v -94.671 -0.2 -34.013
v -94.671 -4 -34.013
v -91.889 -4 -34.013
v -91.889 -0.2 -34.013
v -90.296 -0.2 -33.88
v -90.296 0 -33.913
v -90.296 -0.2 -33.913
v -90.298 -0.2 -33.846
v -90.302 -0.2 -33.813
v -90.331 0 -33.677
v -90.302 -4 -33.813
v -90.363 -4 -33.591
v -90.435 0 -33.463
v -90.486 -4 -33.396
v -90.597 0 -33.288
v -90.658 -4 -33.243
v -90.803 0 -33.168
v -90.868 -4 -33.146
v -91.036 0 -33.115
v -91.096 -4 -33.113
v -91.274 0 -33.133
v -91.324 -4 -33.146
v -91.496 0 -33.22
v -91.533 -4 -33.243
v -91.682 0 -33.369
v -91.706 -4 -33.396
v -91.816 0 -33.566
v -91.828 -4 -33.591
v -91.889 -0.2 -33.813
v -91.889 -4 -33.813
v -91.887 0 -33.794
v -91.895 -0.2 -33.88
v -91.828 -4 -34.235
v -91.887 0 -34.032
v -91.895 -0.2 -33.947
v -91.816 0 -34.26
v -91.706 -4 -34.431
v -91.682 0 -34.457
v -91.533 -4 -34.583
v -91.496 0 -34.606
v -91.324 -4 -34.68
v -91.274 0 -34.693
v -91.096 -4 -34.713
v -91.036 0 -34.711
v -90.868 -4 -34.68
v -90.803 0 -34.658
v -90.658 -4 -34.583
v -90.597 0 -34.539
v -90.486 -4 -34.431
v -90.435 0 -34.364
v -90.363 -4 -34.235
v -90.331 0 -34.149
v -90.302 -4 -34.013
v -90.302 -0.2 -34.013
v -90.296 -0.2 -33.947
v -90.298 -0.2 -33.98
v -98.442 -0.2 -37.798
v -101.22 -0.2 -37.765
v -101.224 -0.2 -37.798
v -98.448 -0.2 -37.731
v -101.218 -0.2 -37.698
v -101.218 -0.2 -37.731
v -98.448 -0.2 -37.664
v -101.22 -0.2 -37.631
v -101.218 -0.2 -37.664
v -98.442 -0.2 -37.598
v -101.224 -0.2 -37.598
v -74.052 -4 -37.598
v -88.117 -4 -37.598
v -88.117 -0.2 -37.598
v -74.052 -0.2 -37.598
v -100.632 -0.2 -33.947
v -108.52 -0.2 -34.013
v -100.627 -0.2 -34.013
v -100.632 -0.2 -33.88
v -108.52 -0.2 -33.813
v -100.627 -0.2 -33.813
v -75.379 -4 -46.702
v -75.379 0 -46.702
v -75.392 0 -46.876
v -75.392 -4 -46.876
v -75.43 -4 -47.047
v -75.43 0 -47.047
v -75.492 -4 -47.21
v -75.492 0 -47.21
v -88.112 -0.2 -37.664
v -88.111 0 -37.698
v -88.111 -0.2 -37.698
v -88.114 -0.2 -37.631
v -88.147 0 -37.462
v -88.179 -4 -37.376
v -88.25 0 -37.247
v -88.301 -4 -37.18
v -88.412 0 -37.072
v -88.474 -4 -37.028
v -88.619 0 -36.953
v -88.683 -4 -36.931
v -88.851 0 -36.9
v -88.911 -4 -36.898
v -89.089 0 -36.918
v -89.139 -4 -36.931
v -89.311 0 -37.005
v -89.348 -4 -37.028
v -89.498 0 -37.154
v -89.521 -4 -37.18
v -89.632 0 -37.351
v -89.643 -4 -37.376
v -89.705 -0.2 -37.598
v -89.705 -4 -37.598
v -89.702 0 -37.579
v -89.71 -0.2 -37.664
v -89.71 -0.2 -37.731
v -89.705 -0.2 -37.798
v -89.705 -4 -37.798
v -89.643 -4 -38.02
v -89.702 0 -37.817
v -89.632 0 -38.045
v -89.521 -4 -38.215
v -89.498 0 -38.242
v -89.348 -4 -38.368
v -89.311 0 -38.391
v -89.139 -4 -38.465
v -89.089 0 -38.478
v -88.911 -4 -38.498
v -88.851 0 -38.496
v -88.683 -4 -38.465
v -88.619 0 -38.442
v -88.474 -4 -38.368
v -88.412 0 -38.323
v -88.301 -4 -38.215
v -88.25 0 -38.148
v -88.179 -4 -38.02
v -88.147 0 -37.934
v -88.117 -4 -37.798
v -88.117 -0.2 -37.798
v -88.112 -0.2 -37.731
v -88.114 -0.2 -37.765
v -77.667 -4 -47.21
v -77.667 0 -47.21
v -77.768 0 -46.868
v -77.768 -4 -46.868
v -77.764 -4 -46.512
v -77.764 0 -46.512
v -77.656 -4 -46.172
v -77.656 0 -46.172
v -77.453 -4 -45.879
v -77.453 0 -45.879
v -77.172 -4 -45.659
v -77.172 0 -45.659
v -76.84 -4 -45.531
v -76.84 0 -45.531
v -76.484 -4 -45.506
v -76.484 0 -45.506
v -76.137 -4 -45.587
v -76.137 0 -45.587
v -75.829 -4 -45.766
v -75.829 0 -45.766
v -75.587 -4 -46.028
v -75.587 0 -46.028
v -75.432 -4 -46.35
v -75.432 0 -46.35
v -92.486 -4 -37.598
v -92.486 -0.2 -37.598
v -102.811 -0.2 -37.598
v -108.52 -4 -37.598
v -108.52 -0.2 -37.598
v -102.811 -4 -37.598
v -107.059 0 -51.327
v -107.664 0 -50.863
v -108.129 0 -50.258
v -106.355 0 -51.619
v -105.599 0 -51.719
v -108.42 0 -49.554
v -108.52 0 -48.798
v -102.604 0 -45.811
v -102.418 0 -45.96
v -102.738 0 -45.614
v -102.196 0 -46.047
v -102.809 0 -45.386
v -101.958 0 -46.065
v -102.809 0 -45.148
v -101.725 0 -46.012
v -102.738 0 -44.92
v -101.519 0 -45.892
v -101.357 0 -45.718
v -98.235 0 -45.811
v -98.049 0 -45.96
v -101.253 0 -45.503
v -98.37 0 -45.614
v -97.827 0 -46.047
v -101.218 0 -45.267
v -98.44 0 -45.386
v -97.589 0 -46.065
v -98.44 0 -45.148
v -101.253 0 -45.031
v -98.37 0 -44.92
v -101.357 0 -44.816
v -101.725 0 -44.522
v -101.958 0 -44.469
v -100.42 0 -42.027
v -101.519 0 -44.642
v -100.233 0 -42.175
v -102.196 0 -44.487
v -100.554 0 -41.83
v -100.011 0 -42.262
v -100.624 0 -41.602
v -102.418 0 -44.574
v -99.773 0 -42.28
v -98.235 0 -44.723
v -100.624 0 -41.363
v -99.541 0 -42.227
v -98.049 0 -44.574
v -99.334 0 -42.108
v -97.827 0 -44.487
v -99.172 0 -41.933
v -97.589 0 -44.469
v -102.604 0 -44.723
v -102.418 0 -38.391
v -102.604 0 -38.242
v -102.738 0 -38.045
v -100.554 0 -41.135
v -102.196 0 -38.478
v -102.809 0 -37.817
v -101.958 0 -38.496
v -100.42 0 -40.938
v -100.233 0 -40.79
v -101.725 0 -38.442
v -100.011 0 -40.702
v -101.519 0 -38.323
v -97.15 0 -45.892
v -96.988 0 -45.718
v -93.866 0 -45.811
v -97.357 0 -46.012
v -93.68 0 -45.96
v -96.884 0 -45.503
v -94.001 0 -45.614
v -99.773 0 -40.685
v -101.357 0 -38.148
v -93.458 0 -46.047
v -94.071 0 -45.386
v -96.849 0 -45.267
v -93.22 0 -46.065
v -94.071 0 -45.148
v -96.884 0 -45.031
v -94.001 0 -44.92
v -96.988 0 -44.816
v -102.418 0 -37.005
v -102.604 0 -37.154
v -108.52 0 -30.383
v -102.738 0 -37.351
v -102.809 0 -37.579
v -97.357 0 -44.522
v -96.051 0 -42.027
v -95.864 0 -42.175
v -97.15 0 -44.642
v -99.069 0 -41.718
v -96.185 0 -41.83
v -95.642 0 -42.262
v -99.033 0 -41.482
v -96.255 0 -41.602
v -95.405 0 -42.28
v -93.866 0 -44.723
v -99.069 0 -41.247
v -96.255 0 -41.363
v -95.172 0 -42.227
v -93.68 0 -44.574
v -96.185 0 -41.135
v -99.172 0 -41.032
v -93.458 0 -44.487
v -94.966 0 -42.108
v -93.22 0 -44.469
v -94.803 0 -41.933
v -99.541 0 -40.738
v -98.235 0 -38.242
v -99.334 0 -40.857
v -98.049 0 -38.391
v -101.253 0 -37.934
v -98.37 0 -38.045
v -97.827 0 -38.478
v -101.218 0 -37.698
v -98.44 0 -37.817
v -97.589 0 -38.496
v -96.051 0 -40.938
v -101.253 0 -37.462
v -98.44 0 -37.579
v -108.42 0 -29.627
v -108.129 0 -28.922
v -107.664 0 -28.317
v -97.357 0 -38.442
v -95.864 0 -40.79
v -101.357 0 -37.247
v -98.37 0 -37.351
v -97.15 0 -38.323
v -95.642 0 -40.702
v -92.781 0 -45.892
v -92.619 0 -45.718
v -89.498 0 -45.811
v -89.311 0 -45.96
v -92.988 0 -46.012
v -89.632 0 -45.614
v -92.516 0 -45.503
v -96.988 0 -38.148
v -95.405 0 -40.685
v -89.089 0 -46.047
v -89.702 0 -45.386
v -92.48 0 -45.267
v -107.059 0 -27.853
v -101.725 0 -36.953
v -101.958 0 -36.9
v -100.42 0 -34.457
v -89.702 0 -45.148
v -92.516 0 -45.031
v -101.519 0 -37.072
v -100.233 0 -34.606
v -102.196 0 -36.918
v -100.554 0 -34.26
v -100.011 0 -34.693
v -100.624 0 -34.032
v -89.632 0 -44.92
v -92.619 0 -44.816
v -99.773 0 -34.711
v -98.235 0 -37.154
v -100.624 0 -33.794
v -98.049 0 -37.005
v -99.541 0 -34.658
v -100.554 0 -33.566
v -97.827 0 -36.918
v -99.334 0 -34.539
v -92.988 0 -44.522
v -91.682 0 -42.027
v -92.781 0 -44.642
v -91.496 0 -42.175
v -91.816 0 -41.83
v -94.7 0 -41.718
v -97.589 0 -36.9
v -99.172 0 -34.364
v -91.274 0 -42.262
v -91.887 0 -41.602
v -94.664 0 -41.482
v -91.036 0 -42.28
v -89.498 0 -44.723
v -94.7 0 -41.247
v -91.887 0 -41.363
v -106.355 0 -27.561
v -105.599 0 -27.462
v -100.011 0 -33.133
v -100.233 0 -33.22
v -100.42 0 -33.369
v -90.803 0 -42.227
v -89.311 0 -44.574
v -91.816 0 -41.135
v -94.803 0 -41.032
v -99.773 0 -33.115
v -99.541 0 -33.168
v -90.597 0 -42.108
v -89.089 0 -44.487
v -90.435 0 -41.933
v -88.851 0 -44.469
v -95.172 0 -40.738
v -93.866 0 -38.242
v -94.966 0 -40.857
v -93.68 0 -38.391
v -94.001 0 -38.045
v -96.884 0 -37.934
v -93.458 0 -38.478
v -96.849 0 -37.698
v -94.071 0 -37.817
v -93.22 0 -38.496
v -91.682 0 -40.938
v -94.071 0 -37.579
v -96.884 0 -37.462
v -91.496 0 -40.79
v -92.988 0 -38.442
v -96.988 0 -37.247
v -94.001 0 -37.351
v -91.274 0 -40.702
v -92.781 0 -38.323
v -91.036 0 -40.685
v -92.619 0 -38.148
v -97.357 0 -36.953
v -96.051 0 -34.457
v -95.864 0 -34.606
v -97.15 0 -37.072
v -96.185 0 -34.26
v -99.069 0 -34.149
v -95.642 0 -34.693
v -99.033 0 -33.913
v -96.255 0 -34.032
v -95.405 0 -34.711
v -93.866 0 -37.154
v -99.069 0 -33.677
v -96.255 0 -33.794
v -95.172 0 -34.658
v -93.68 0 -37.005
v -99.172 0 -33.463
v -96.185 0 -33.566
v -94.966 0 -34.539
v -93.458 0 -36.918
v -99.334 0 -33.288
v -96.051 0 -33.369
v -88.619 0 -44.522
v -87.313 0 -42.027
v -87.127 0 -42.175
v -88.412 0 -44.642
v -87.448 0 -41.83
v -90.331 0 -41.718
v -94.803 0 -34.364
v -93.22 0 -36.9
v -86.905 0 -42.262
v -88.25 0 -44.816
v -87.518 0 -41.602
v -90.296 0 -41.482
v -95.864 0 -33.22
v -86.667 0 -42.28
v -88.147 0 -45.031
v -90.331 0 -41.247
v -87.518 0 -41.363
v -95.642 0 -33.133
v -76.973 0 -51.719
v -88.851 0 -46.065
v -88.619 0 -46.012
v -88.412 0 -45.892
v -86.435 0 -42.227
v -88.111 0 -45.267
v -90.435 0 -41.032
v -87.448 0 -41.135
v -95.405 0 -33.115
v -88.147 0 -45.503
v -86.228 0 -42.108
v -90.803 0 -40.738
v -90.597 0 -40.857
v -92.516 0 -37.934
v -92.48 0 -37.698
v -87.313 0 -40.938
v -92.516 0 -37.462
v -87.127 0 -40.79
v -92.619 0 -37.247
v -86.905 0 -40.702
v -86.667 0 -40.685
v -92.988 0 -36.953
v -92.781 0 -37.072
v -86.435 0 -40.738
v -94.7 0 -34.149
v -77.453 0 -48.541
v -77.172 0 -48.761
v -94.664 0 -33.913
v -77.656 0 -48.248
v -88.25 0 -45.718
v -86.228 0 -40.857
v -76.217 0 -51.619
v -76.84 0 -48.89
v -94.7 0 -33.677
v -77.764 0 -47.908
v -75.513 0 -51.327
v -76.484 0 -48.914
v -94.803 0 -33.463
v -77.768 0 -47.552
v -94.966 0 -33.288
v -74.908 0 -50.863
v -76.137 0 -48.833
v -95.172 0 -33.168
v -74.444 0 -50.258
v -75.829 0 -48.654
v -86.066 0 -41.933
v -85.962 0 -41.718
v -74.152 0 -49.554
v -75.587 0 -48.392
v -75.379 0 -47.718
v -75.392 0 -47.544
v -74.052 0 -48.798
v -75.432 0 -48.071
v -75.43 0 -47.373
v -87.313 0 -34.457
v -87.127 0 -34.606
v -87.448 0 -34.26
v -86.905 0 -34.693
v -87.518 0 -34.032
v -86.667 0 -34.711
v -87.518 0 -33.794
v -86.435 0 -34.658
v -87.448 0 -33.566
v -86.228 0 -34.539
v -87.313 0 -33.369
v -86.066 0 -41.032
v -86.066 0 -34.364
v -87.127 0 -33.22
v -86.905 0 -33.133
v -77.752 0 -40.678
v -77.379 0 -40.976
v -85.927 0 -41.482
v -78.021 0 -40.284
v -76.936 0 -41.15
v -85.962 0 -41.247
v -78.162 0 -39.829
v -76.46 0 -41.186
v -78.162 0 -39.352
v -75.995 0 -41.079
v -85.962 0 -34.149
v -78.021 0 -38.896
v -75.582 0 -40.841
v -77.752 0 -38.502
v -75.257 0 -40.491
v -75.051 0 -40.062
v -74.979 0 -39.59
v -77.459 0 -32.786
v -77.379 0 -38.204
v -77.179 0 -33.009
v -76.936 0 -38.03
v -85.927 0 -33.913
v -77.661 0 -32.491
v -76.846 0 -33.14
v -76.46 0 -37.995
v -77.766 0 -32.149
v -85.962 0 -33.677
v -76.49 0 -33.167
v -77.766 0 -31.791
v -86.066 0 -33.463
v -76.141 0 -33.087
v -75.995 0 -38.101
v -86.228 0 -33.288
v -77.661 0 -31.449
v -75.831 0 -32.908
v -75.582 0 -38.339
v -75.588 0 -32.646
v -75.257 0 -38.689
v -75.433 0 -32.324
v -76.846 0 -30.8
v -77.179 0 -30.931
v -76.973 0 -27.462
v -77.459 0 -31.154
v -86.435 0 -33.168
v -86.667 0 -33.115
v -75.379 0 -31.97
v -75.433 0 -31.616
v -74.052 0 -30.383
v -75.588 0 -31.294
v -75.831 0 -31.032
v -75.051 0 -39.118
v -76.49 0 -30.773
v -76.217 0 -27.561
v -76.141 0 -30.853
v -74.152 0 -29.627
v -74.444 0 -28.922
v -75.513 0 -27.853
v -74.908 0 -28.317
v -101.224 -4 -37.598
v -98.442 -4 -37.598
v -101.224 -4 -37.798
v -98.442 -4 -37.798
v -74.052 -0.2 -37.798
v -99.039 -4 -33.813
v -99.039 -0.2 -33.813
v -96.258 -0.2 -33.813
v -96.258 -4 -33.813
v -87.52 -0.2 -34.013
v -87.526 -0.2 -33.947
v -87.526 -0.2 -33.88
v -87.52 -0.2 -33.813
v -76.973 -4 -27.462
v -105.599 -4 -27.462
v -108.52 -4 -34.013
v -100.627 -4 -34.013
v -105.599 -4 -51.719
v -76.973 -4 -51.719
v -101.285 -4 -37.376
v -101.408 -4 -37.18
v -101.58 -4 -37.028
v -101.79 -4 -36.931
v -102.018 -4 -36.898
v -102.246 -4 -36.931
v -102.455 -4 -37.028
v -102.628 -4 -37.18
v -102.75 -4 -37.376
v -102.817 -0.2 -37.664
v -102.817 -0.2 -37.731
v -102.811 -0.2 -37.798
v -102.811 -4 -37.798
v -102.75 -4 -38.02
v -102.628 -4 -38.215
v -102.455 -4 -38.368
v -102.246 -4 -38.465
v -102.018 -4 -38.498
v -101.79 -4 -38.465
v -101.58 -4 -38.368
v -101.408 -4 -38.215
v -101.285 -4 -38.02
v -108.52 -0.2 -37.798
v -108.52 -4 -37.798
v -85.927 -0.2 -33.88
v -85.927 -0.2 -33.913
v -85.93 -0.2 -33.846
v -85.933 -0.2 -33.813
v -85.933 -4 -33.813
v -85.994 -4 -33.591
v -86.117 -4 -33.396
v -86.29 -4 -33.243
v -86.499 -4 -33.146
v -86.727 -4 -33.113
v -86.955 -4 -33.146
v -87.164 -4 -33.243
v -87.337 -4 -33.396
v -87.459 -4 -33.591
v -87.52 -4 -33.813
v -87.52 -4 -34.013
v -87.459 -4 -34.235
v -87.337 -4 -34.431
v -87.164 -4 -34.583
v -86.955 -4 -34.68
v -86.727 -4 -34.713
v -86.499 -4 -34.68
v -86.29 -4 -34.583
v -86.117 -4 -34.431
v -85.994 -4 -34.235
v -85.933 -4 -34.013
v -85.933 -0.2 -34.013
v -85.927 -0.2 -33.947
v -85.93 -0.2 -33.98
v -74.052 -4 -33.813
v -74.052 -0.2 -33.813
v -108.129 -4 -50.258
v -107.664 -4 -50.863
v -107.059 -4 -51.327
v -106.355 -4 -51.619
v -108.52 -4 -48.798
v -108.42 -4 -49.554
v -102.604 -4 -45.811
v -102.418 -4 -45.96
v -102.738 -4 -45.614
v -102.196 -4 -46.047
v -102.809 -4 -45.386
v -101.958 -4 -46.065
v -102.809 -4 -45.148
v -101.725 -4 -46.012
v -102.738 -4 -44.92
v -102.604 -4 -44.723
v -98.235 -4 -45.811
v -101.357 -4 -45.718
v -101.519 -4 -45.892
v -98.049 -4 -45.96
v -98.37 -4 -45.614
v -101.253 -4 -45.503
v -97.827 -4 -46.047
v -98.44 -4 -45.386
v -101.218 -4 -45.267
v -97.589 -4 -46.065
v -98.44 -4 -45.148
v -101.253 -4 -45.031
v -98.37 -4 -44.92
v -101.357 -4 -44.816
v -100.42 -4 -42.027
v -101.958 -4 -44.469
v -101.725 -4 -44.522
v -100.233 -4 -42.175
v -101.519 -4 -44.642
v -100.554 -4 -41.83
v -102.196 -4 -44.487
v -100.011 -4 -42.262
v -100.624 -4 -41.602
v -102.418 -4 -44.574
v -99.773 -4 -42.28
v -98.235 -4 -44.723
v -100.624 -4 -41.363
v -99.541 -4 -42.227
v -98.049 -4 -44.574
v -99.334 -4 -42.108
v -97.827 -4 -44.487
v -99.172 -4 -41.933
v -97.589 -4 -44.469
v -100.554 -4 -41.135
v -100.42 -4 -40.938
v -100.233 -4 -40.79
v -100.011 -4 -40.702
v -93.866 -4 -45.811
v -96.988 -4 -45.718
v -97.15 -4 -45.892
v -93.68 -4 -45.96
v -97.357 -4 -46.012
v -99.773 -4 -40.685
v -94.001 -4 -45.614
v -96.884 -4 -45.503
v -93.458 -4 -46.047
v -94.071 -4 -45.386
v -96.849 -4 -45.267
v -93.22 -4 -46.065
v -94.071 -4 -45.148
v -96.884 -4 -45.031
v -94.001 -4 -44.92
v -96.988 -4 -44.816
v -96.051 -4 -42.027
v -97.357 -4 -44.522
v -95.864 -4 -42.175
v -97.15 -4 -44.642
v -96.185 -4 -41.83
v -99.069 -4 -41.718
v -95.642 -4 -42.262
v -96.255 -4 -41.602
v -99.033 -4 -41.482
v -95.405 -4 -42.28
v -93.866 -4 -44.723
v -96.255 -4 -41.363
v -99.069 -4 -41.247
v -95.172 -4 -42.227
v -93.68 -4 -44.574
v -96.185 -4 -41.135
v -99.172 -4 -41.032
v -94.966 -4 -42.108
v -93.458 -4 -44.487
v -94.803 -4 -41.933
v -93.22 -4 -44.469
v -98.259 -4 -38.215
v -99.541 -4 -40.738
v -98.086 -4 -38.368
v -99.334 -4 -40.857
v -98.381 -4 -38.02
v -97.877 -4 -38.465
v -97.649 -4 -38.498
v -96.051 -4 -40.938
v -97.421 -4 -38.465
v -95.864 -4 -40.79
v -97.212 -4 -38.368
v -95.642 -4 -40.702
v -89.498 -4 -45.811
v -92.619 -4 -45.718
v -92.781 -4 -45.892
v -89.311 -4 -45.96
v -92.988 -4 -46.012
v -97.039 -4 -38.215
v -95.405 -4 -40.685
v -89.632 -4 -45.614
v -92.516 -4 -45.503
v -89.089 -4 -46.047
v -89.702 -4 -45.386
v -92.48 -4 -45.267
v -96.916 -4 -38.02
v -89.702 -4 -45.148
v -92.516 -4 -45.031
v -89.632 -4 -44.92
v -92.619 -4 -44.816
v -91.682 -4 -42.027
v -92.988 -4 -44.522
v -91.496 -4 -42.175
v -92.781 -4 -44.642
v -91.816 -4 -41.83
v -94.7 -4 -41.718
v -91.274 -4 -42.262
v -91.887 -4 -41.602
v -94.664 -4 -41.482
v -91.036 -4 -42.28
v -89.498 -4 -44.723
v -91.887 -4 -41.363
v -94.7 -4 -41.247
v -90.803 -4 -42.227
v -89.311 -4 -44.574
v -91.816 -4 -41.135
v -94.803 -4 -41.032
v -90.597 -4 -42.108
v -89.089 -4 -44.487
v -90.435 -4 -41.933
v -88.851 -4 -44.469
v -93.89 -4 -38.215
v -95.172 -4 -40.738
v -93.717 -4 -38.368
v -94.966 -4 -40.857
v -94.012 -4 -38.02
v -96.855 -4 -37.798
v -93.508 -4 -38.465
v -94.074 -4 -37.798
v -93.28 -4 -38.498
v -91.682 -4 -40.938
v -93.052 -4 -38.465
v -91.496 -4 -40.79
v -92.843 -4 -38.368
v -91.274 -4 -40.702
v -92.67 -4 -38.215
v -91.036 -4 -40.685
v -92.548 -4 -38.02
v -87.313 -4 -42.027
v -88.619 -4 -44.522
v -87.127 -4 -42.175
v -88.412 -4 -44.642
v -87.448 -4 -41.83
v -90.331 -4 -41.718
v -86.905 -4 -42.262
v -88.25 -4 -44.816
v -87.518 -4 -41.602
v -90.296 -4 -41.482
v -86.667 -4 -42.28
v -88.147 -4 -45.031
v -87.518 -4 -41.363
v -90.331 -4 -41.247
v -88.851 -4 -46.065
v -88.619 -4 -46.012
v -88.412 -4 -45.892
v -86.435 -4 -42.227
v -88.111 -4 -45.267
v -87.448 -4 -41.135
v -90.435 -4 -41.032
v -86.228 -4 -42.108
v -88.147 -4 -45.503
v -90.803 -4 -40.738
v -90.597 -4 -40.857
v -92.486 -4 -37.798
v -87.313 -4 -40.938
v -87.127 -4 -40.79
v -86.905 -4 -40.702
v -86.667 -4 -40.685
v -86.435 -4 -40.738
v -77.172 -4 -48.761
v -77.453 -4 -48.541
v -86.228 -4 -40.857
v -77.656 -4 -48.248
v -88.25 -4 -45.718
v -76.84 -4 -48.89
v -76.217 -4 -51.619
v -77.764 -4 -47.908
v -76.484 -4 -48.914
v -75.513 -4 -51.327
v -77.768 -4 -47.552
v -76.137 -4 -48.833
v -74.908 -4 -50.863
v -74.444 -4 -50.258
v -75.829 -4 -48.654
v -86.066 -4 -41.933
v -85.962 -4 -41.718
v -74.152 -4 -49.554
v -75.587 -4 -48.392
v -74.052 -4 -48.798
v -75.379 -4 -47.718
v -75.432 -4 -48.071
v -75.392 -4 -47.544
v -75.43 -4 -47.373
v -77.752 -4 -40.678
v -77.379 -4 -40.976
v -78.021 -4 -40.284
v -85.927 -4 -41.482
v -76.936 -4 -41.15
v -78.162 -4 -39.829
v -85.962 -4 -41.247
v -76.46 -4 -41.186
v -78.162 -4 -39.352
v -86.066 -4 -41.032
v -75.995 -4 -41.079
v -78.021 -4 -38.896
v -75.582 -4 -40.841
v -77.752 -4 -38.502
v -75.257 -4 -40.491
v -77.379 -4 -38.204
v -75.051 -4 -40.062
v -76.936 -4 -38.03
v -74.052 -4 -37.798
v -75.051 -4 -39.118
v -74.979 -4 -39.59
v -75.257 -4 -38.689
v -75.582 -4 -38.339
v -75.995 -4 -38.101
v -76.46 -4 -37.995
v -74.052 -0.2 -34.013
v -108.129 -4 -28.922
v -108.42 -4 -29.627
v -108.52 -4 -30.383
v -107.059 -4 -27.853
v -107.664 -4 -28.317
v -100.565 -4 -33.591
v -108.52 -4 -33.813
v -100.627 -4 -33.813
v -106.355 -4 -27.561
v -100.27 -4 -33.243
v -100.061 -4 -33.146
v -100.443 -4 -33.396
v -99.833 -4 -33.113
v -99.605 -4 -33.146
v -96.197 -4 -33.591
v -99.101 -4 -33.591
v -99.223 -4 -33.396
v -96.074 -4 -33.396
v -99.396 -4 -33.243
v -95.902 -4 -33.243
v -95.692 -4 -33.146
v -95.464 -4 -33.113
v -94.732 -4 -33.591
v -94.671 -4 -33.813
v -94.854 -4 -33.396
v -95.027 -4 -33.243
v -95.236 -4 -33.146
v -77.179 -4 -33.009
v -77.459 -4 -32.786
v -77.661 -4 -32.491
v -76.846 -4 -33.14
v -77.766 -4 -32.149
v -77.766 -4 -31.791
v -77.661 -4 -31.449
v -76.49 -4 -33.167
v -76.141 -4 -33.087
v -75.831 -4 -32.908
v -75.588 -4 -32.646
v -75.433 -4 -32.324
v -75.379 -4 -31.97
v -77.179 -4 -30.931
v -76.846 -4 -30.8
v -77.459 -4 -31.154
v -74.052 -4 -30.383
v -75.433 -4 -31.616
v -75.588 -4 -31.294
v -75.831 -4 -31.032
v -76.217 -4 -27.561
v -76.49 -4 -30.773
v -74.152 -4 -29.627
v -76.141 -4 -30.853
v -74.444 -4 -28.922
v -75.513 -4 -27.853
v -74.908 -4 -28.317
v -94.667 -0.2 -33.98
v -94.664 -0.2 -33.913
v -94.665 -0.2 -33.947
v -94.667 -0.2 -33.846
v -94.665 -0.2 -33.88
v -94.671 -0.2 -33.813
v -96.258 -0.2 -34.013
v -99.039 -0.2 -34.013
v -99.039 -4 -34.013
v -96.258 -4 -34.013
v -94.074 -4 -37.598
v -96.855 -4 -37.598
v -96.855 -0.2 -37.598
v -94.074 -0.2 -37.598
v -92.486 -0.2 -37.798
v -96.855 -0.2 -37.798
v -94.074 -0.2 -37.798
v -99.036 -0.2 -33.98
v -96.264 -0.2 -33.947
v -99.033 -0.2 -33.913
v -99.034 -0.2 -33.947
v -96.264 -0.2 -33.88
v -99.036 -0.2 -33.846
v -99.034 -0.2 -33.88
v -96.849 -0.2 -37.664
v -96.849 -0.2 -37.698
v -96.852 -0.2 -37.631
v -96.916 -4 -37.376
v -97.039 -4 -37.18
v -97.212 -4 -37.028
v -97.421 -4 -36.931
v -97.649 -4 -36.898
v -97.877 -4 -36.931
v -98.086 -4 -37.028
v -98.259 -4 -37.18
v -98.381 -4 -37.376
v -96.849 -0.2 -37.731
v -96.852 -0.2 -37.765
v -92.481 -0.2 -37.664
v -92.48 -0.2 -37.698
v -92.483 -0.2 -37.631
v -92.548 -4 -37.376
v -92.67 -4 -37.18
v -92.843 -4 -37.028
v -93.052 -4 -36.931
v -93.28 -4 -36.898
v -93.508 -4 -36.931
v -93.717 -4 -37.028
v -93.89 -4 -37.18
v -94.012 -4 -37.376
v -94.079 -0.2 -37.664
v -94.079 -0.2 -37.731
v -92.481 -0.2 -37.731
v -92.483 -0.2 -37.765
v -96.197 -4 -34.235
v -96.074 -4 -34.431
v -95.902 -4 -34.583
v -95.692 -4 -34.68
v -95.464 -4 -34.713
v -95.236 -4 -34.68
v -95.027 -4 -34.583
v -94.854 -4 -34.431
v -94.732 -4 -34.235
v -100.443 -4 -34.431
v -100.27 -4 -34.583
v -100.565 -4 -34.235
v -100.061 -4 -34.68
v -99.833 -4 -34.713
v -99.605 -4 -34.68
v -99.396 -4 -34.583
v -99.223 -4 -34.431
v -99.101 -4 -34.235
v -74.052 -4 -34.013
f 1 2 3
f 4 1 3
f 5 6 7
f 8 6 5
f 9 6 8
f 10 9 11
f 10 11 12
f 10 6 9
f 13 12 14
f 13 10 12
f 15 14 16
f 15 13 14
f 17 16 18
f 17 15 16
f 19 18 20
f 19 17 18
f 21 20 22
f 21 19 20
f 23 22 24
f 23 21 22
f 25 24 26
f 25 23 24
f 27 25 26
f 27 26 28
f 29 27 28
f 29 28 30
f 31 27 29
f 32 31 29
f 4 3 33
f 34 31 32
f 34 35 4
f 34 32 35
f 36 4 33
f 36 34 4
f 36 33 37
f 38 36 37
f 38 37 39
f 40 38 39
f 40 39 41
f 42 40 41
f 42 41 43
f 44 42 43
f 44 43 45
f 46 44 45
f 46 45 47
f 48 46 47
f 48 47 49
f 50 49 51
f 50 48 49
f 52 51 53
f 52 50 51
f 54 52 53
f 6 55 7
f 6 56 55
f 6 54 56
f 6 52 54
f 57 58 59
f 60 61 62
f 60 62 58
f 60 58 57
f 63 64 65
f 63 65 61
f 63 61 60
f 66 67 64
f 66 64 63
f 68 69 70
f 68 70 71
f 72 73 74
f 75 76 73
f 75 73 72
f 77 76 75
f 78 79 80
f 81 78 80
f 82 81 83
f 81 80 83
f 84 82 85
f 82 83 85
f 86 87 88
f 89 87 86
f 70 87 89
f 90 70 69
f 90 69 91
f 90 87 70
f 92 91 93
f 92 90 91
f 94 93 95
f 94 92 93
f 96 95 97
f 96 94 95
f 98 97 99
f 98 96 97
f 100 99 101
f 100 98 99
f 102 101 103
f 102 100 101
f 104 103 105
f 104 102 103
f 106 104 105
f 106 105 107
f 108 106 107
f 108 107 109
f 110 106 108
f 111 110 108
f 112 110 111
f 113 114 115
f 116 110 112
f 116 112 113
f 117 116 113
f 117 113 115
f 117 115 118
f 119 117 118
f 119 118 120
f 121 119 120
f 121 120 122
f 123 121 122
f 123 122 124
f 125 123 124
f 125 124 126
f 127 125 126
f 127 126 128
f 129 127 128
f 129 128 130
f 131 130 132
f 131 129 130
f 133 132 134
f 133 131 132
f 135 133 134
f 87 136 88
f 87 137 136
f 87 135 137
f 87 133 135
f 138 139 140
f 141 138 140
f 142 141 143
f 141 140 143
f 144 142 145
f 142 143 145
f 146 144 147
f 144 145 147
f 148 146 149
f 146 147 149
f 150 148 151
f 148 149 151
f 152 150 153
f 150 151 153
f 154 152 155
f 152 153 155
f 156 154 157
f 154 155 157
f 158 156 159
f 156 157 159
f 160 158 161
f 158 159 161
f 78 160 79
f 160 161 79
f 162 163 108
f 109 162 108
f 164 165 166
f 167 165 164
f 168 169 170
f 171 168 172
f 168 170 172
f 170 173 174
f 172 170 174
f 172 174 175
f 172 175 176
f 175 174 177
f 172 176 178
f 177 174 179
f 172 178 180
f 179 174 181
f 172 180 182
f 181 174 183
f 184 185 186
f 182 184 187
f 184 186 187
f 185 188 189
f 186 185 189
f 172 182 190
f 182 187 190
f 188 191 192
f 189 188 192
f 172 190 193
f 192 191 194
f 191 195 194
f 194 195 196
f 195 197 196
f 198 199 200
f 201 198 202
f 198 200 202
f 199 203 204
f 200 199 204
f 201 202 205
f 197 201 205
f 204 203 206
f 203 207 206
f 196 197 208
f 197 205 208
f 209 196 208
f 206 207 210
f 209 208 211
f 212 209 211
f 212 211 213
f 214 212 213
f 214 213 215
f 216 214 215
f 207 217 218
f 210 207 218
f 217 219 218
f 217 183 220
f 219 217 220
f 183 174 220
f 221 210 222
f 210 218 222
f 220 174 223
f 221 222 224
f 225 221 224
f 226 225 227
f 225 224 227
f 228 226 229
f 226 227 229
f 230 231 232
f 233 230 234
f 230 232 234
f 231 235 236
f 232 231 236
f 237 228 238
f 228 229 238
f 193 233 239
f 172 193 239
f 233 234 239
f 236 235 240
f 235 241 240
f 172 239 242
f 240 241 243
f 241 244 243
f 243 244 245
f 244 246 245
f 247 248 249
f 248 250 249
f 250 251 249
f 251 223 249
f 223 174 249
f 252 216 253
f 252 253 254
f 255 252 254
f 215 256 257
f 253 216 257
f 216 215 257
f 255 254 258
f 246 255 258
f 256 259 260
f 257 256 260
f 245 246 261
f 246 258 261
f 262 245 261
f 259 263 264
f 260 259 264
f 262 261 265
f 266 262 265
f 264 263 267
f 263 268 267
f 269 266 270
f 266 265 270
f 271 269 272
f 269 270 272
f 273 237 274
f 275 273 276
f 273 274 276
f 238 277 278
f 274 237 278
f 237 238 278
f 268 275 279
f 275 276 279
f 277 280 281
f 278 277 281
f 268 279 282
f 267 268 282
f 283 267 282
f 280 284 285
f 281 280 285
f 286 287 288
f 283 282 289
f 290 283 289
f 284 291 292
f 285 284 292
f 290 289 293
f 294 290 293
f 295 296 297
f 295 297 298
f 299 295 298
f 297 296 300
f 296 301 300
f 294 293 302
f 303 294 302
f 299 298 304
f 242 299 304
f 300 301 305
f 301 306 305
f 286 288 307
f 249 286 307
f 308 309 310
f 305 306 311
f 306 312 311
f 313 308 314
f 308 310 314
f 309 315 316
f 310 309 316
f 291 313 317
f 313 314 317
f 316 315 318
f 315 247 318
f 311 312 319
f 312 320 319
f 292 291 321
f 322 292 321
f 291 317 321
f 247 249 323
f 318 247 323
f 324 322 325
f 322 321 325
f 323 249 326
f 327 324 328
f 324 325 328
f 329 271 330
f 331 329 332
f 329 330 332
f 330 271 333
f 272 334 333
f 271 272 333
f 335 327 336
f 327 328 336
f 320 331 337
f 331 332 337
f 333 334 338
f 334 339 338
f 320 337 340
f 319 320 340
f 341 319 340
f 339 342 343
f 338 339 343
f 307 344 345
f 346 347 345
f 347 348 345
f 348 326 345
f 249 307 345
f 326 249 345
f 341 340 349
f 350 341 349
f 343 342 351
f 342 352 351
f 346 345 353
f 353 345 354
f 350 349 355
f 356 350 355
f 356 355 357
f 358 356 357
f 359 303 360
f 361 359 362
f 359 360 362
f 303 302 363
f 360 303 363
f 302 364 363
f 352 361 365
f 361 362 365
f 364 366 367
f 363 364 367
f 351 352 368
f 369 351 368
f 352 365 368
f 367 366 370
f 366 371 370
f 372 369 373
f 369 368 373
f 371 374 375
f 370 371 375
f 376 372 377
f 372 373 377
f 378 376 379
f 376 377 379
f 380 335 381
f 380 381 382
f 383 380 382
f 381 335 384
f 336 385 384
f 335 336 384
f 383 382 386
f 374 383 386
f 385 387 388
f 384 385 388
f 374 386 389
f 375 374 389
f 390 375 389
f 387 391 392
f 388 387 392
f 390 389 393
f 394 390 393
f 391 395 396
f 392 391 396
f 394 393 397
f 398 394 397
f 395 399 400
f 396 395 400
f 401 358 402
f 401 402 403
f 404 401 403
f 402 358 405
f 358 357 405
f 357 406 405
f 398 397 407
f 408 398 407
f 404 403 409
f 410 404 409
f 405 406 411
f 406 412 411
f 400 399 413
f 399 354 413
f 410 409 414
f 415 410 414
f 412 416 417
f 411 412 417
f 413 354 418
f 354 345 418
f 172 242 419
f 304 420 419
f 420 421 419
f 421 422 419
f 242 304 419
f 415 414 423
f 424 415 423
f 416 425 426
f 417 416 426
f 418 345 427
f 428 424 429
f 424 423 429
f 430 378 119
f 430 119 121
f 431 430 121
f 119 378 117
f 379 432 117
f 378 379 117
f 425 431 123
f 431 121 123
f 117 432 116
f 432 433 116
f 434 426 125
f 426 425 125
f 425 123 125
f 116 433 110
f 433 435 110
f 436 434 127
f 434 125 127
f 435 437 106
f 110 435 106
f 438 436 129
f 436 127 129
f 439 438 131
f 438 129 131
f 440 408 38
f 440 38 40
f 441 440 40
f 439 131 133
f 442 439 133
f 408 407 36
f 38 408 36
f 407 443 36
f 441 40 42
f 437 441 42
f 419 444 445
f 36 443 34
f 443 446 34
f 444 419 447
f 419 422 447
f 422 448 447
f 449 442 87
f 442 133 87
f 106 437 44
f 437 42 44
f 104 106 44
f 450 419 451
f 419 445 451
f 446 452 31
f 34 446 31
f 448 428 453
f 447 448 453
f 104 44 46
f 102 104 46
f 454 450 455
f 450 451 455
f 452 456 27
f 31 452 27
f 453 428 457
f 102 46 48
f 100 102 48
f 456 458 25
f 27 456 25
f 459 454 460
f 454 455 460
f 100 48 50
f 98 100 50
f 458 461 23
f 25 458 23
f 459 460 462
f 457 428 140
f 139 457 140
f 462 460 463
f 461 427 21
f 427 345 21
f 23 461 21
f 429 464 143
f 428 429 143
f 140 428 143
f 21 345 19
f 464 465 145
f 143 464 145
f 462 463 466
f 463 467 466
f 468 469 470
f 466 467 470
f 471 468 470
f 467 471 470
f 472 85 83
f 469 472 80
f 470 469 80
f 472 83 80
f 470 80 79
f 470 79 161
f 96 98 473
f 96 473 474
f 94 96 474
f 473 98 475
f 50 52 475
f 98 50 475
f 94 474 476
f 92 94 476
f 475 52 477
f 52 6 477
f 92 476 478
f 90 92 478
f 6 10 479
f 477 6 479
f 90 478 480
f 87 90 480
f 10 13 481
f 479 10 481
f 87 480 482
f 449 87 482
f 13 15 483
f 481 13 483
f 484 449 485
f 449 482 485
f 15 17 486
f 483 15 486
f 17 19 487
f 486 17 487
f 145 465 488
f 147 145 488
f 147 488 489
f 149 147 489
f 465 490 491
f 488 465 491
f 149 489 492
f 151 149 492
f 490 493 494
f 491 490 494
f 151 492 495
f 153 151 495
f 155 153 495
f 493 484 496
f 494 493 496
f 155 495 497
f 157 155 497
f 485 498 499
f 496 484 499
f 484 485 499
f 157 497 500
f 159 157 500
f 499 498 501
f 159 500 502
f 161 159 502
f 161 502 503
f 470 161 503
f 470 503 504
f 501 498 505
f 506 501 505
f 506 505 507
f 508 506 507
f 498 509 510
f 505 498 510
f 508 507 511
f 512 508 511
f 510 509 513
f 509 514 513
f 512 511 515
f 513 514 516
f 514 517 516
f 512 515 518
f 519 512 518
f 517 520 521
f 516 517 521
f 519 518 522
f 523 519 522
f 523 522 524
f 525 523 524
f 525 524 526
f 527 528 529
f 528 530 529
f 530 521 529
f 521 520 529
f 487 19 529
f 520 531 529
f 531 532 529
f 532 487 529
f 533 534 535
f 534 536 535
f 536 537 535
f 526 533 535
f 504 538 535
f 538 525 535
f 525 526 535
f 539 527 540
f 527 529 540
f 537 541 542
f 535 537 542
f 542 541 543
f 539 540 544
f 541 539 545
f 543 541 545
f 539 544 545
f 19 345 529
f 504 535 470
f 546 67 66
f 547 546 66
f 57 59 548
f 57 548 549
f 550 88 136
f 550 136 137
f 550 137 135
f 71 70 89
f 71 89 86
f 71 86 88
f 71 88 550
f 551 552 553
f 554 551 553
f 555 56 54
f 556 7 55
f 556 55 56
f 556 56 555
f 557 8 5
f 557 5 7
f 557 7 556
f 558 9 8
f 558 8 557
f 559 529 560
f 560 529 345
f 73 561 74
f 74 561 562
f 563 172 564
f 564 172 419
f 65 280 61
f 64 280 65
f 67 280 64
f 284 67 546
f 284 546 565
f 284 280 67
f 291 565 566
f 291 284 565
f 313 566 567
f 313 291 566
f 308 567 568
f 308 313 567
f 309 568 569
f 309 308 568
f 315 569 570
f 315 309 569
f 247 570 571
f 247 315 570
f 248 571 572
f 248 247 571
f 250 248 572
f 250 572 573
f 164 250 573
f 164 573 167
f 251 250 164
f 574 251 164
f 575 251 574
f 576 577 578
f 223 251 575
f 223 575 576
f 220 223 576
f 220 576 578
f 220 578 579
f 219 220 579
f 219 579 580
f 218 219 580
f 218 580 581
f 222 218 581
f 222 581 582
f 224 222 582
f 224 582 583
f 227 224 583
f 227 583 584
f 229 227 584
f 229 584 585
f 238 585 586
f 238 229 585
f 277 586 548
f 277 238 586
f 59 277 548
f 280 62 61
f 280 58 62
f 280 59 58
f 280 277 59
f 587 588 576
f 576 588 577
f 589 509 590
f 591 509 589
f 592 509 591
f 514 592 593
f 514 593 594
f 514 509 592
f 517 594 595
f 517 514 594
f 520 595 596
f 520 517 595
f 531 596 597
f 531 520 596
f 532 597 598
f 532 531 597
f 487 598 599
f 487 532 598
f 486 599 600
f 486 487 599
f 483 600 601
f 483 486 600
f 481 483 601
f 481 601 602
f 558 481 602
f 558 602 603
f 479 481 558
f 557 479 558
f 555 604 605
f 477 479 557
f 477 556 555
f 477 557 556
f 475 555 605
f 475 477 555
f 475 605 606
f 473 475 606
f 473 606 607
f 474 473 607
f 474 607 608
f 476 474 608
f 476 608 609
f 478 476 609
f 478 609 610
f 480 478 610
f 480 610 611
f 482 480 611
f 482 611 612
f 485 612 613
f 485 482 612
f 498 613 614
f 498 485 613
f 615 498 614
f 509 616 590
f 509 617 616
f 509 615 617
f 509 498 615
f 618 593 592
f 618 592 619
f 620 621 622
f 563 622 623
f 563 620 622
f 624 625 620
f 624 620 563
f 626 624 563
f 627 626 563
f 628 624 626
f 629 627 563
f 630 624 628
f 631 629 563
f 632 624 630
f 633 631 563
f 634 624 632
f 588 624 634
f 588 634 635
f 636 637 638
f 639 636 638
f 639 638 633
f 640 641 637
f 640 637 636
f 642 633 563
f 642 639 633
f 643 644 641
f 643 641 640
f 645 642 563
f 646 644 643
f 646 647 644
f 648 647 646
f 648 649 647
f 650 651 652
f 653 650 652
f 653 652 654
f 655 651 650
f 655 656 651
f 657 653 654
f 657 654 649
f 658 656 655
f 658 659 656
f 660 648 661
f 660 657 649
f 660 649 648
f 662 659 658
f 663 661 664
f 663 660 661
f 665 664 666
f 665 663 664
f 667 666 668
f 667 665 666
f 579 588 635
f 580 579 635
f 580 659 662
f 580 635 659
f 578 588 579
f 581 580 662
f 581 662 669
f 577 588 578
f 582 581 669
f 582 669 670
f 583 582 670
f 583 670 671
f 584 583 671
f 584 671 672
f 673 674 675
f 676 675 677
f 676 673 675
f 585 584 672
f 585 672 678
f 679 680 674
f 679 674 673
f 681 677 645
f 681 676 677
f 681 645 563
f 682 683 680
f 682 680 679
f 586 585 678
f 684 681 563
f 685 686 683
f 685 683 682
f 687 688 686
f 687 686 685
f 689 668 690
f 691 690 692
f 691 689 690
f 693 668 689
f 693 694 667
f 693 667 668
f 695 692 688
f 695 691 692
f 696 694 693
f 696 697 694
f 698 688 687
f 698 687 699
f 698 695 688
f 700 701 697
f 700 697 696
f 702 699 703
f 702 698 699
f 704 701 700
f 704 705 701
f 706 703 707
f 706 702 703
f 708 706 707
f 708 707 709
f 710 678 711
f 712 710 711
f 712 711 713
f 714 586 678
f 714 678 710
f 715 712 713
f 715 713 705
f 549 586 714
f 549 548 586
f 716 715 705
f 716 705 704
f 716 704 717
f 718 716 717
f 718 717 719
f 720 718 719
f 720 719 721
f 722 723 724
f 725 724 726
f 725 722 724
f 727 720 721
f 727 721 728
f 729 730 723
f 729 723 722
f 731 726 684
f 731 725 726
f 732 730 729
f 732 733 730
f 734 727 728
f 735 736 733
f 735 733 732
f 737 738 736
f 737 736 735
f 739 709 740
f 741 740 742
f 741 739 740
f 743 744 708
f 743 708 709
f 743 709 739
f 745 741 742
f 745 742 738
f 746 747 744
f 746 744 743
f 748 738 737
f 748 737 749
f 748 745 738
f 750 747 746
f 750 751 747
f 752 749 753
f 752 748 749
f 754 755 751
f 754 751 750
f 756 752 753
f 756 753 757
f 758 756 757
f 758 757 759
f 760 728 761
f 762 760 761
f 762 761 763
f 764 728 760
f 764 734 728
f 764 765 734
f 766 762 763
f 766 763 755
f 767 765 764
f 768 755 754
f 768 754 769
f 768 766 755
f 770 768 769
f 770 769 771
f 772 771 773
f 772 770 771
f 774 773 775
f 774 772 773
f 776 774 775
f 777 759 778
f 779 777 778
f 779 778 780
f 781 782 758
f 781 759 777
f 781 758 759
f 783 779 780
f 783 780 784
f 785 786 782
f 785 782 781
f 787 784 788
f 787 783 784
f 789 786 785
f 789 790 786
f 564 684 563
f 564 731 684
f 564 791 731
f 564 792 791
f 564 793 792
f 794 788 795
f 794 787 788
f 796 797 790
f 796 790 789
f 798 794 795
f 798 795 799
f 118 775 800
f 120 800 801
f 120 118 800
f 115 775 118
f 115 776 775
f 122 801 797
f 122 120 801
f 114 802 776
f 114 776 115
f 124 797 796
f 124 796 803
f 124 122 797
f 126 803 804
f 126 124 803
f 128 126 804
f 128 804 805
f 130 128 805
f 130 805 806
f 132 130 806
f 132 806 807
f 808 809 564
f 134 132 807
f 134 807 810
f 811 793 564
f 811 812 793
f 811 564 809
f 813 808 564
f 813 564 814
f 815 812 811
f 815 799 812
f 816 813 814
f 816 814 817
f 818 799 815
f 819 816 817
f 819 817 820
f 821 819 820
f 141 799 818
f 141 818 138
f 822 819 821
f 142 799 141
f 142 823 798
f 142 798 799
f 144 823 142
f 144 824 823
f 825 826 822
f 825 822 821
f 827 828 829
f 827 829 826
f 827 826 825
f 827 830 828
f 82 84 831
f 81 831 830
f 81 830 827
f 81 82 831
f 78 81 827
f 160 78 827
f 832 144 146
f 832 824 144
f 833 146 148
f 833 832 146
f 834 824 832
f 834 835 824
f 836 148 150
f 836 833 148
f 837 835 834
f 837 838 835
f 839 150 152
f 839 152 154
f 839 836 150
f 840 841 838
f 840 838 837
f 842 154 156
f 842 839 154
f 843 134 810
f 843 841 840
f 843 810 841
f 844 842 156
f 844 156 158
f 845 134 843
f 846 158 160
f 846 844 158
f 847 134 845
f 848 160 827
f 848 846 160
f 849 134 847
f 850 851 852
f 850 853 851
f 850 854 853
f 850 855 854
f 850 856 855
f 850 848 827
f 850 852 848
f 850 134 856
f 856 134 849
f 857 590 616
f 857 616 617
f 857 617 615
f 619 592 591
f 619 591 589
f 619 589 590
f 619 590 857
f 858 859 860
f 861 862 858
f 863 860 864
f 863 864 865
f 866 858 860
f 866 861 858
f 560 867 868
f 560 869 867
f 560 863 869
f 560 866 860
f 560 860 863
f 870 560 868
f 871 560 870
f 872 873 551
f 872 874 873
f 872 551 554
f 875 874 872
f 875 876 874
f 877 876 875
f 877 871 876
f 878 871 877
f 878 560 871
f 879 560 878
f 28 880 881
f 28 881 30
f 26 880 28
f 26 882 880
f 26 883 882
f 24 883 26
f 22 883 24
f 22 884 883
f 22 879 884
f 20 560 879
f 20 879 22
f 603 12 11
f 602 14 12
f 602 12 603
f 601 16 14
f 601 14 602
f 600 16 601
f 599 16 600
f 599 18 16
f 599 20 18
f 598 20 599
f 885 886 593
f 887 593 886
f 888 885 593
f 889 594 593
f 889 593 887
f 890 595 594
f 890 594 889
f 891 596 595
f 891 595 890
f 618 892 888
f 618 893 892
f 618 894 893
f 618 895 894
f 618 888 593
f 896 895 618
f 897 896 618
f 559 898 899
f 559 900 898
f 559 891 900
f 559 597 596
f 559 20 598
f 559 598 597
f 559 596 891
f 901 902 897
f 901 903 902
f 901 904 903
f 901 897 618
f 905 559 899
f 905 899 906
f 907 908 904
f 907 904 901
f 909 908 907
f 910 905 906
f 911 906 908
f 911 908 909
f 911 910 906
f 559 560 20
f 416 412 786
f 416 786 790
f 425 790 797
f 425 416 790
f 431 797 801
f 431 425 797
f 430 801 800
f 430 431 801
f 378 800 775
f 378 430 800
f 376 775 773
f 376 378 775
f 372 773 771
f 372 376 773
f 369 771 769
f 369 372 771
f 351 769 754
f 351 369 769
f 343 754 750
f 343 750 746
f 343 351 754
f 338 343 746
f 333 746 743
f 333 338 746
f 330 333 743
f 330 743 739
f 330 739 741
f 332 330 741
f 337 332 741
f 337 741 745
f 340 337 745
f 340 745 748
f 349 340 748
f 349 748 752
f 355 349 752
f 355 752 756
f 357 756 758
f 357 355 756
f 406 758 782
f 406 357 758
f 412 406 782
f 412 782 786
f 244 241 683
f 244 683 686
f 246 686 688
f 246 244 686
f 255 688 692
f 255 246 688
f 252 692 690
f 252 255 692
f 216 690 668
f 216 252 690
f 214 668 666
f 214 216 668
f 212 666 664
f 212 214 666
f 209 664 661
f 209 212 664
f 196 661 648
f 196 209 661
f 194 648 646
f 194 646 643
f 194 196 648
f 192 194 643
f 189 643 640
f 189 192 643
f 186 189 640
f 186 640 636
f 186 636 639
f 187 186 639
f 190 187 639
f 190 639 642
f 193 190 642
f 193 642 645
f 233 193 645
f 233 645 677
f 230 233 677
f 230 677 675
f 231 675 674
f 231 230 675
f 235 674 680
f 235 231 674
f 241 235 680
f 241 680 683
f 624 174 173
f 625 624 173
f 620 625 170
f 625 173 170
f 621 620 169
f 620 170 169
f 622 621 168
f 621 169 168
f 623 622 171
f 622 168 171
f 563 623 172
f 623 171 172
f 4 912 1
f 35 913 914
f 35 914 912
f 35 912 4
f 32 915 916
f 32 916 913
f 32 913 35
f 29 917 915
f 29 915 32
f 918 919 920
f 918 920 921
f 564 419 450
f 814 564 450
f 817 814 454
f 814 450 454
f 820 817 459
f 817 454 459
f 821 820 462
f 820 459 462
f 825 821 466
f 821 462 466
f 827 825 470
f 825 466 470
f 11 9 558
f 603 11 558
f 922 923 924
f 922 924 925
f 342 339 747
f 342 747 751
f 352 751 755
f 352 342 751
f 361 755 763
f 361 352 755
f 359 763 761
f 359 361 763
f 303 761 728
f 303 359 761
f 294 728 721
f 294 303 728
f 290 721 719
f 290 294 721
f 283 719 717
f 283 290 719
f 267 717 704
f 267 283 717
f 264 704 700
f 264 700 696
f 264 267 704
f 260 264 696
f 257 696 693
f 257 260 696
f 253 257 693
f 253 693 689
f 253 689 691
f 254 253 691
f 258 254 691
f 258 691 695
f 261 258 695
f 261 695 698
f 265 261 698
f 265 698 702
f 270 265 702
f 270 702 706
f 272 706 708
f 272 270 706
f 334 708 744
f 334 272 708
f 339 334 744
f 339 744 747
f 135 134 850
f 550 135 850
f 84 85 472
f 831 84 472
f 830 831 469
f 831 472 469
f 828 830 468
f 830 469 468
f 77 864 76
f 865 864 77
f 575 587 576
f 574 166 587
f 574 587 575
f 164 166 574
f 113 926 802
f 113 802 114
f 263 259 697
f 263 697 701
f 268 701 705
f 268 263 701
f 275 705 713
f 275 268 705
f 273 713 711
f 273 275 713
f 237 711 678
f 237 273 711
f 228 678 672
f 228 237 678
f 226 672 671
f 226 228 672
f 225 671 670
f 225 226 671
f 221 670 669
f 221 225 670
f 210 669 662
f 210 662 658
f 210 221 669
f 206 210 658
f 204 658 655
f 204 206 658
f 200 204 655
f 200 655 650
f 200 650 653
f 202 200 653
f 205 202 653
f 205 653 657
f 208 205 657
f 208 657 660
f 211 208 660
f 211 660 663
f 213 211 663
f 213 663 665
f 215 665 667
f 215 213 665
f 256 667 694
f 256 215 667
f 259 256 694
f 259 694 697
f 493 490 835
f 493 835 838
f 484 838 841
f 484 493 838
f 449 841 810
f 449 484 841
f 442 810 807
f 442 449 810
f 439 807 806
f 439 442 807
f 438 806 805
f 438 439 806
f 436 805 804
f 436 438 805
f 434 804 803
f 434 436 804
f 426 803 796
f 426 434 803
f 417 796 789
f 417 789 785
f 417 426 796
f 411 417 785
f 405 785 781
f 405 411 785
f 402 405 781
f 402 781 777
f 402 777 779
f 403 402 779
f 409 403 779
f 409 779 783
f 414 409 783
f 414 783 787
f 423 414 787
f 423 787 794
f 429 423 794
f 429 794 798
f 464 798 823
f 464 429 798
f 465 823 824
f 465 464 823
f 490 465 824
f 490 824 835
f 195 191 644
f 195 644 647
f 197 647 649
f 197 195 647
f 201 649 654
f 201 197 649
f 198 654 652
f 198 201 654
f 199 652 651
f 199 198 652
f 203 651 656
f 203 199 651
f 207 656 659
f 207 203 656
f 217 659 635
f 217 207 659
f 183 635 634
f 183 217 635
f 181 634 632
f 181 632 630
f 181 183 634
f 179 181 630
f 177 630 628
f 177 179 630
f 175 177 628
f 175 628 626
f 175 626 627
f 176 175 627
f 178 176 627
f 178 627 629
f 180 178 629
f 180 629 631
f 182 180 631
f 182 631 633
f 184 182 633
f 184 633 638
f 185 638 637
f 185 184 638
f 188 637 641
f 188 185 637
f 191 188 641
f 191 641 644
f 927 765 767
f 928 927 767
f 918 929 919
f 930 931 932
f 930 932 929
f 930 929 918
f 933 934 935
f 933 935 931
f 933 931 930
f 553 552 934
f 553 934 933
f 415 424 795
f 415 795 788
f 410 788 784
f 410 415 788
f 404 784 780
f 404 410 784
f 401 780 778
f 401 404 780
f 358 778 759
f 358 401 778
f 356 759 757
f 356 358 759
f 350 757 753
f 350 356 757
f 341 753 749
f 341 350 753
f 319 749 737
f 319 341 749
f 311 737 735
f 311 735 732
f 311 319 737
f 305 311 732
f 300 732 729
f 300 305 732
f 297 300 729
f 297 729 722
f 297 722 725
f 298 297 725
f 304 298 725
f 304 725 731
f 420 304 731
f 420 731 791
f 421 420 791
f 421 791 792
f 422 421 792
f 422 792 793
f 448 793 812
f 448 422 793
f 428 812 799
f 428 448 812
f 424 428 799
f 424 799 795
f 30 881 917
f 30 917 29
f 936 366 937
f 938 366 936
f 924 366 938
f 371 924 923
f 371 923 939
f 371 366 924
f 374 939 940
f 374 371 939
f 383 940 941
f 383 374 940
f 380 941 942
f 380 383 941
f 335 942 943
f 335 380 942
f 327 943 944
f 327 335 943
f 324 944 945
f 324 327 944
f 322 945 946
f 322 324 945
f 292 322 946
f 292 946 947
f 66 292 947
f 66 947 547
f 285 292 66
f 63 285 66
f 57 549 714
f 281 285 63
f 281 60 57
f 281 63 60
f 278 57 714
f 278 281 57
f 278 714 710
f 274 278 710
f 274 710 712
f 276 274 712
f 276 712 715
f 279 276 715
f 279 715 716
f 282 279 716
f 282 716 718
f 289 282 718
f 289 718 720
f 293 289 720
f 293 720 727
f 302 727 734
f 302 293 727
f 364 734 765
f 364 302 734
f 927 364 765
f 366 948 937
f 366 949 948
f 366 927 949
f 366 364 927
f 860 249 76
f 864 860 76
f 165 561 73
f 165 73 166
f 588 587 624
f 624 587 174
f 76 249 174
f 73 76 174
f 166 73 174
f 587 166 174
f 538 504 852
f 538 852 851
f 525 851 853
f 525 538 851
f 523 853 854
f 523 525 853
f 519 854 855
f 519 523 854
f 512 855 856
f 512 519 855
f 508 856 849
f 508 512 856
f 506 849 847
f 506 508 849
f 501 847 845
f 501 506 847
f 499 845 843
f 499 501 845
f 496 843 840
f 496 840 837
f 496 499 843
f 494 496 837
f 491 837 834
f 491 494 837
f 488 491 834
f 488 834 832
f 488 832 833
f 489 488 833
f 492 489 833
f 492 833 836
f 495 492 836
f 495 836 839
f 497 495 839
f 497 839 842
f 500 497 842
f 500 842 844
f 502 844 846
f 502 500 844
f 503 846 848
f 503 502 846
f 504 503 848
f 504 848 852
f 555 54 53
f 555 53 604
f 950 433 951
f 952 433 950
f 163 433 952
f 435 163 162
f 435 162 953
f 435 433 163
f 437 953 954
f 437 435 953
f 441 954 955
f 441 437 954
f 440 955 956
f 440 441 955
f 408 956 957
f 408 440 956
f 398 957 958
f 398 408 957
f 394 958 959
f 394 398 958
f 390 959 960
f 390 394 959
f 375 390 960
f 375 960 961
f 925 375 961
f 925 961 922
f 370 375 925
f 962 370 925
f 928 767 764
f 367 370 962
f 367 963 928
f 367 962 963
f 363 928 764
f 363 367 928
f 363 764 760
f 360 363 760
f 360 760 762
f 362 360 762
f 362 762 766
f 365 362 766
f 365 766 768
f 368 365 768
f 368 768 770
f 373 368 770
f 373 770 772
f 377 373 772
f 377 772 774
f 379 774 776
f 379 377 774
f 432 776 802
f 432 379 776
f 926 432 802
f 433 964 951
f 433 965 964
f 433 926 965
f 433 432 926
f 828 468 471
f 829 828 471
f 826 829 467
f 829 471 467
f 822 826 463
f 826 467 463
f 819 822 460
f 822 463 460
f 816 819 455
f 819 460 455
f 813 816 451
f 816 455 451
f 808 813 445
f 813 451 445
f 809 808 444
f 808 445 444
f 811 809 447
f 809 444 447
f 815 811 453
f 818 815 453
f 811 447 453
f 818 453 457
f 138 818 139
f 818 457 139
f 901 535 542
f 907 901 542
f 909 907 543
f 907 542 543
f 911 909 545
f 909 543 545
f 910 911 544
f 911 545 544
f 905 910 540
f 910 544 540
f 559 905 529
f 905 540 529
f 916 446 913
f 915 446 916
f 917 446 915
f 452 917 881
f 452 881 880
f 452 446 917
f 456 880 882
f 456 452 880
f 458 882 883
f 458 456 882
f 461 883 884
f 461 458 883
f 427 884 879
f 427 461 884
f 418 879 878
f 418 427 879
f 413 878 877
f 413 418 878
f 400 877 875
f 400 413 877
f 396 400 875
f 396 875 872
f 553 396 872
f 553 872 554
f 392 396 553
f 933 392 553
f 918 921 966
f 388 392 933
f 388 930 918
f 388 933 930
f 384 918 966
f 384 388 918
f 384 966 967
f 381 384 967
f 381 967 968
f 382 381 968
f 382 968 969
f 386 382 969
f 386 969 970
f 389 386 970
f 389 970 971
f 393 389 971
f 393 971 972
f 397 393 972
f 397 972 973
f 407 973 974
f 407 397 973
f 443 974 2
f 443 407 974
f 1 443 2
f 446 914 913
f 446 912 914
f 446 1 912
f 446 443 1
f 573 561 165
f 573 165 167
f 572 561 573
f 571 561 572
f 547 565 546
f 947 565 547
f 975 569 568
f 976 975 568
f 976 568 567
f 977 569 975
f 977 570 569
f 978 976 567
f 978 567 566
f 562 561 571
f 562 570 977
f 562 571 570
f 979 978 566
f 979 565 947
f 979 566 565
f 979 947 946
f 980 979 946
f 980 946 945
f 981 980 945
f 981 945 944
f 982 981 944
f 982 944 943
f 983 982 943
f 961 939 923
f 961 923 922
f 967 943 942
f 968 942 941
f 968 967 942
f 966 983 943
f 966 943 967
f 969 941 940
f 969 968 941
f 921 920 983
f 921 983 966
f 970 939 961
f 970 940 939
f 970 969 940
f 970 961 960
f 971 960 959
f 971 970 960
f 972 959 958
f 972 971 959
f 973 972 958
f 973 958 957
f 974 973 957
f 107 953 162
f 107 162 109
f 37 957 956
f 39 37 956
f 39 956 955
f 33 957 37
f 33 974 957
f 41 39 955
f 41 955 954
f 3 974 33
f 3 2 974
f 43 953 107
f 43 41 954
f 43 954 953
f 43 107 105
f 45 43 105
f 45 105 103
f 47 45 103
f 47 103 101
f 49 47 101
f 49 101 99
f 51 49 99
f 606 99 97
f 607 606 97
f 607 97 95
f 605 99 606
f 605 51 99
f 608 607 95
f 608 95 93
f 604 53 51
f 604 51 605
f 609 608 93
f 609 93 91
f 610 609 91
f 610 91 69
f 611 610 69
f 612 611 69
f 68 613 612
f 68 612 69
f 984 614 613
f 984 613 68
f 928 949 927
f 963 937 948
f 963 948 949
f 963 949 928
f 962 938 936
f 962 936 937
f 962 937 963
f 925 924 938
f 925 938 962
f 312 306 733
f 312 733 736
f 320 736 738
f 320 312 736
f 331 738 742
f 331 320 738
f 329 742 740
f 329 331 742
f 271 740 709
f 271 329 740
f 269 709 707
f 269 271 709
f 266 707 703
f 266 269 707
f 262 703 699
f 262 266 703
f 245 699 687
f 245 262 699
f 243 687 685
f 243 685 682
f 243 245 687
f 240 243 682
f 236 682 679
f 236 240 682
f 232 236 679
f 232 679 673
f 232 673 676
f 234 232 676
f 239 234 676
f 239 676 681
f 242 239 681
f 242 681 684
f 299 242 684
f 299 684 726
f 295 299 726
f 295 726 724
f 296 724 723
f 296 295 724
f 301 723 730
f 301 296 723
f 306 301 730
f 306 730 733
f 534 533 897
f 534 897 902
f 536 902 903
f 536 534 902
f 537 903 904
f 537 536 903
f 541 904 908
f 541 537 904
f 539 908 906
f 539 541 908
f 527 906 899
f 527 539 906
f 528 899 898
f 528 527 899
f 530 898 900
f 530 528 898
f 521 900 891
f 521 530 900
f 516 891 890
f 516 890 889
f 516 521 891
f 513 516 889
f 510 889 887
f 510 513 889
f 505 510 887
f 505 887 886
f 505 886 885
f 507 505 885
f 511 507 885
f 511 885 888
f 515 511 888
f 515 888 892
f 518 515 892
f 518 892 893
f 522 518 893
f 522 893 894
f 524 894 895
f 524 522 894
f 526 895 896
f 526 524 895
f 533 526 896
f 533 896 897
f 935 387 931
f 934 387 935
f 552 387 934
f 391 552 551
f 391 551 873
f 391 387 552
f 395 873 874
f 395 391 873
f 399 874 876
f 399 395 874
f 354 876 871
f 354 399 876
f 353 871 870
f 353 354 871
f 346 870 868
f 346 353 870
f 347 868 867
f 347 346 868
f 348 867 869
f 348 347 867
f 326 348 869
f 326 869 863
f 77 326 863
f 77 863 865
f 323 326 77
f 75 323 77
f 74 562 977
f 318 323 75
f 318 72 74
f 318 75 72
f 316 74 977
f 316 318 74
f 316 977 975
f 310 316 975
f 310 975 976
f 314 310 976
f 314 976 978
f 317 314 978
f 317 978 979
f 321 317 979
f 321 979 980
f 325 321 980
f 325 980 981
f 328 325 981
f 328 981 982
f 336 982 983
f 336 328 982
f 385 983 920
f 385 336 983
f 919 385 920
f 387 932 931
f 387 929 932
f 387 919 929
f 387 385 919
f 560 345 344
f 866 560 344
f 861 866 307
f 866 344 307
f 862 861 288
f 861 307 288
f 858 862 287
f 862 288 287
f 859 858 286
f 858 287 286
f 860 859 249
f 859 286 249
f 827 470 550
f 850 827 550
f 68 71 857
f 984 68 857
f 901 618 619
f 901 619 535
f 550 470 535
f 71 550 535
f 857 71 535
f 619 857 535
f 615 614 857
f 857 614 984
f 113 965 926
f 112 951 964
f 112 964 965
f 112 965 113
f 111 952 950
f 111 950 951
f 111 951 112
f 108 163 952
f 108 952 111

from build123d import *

# Parameters (mm, degrees)
F0_R     = 0.8
F0_R_2   = 1.6
F0_R_3   = 1.2
F1_DEPTH = 4
F2_W     = 34.4678
F2_H     = 0.2
F3_DEPTH = 3.8


with BuildPart() as f1:
    # F0 (on Front) → F1 (new body)
    with BuildSketch(Plane.XZ):
        with BuildLine():
            Line((-76.973173, -27.461596), (-105.598973, -27.461596))
            ThreePointArc((-105.598973, -27.461596), (-107.664432, -28.317137), (-108.519973, -30.382596))
            Line((-108.519973, -30.382596), (-108.519973, -48.797596))
            ThreePointArc((-108.519973, -48.797596), (-107.664432, -50.863055), (-105.598973, -51.718596))
            Line((-105.598973, -51.718596), (-76.973173, -51.718596))
            ThreePointArc((-76.973173, -51.718596), (-74.907714, -50.863055), (-74.052173, -48.797596))
            Line((-74.052173, -48.797596), (-74.052173, -30.382596))
            ThreePointArc((-74.052173, -30.382596), (-74.907714, -28.317137), (-76.973173, -27.461596))
        make_face()
        with Locations((-102.017573, -45.266996)):
            Circle(F0_R, mode=Mode.SUBTRACT)
        with Locations((-97.648773, -45.266996)):
            Circle(F0_R, mode=Mode.SUBTRACT)
        with Locations((-93.279973, -45.266996)):
            Circle(F0_R, mode=Mode.SUBTRACT)
        with Locations((-99.833173, -41.482396)):
            Circle(F0_R, mode=Mode.SUBTRACT)
        with Locations((-95.464373, -41.482396)):
            Circle(F0_R, mode=Mode.SUBTRACT)
        with BuildLine():
            ThreePointArc((-77.666642, -47.210096), (-76.839663, -45.530643), (-75.379473, -46.702096))
            ThreePointArc((-75.379473, -46.702096), (-75.40802, -46.962285), (-75.492304, -47.210096))
            ThreePointArc((-75.492304, -47.210096), (-75.40802, -47.457906), (-75.379473, -47.718096))
            ThreePointArc((-75.379473, -47.718096), (-76.839663, -48.889548), (-77.666642, -47.210096))
        make_face(mode=Mode.SUBTRACT)
        with Locations((-88.911173, -45.266996)):
            Circle(F0_R, mode=Mode.SUBTRACT)
        with Locations((-91.095573, -41.482396)):
            Circle(F0_R, mode=Mode.SUBTRACT)
        with Locations((-86.726773, -41.482396)):
            Circle(F0_R, mode=Mode.SUBTRACT)
        with Locations((-76.579473, -39.590096)):
            Circle(F0_R_2, mode=Mode.SUBTRACT)
        with Locations((-102.017573, -37.697796)):
            Circle(F0_R, mode=Mode.SUBTRACT)
        with Locations((-97.648773, -37.697796)):
            Circle(F0_R, mode=Mode.SUBTRACT)
        with Locations((-93.279973, -37.697796)):
            Circle(F0_R, mode=Mode.SUBTRACT)
        with Locations((-99.833173, -33.913196)):
            Circle(F0_R, mode=Mode.SUBTRACT)
        with Locations((-95.464373, -33.913196)):
            Circle(F0_R, mode=Mode.SUBTRACT)
        with Locations((-88.911173, -37.697796)):
            Circle(F0_R, mode=Mode.SUBTRACT)
        with Locations((-91.095573, -33.913196)):
            Circle(F0_R, mode=Mode.SUBTRACT)
        with Locations((-86.726773, -33.913196)):
            Circle(F0_R, mode=Mode.SUBTRACT)
        with Locations((-76.579473, -31.970096)):
            Circle(F0_R_3, mode=Mode.SUBTRACT)
    extrude(amount=F1_DEPTH)

    # F2 (on face) → F3 (cut)
    with BuildSketch(Plane.XZ.offset(4)):
        with Locations((-91.286073, -33.913196)):
            Rectangle(F2_W, F2_H)
        with Locations((-91.286073, -37.697796)):
            Rectangle(F2_W, F2_H)
    extrude(amount=-F3_DEPTH, mode=Mode.SUBTRACT)


solid = f1.part
